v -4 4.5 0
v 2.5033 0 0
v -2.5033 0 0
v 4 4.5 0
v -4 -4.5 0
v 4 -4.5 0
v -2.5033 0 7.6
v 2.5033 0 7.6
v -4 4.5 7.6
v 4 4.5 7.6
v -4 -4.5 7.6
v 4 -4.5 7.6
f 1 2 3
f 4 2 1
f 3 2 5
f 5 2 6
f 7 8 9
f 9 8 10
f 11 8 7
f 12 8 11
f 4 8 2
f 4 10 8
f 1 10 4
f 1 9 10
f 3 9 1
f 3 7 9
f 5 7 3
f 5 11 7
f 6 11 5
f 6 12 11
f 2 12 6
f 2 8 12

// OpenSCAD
// file: ../lib/profile.scad
// Shared geometry: the foot and socket shapes every part is built from.
include <constants.scad>

// 2D rectangle of the given outer size with rounded corners, centred on the origin.
module rounded_rect(size, r) {
    offset(r = r) square([size.x - 2 * r, size.y - 2 * r], center = true);
}

// Solid whose outline shrinks with height according to `profile`,
// a bottom-to-top list of [z, inset from `size`]. Corner radius follows the inset.
module stepped_solid(size, r, profile) {
    for (i = [0 : len(profile) - 2]) {
        a = profile[i];
        b = profile[i + 1];
        hull() {
            translate([0, 0, a[0]])
                linear_extrude(EPS) rounded_rect(size - 2 * [a[1], a[1]], r - a[1]);
            translate([0, 0, b[0] - EPS])
                linear_extrude(EPS) rounded_rect(size - 2 * [b[1], b[1]], r - b[1]);
        }
    }
}

// One bin foot, sitting on z = 0, centred on its cell.
module foot() {
    stepped_solid([GRID - CLEARANCE, GRID - CLEARANCE], BIN_R, FOOT_PROFILE);
}

// Negative volume a foot drops into. `size` is the full grid area it spans.
// With through = true it is extended above and below so it cuts clean through a plate.
module socket(size = [GRID, GRID], through = false) {
    lo = SOCKET_PROFILE[0];
    hi = SOCKET_PROFILE[len(SOCKET_PROFILE) - 1];
    profile = through
        ? concat([[lo[0] - 1, lo[1]]], SOCKET_PROFILE, [[hi[0] + 1, hi[1]]])
        : SOCKET_PROFILE;
    stepped_solid(size, SOCKET_R, profile);
}

// Repeat children once per cell of an nx-by-ny grid centred on the origin.
module grid_copies(nx, ny) {
    for (i = [0 : nx - 1], j = [0 : ny - 1])
        translate([(i - (nx - 1) / 2) * GRID, (j - (ny - 1) / 2) * GRID, 0])
            children();
}
// file: ../lib/printer.scad
// Printer limits and the logic for splitting large parts to fit the bed.
// Values are for a Bambu Lab P2S; change them here if the printer changes.
include <constants.scad>

BED        = [256, 256, 256];   // build volume, mm
BED_MARGIN = 5;                 // space kept free at each bed edge (5 -> 5x5 cells max, 2 -> 6x6)

// Largest number of whole grid cells that fit along one bed axis (0 = X, 1 = Y).
function max_cells(axis) = floor((BED[axis] - 2 * BED_MARGIN) / GRID);

// True when a part of the given [x, y, z] size fits the bed.
function fits_bed(size) =
    size.x <= BED.x - 2 * BED_MARGIN &&
    size.y <= BED.y - 2 * BED_MARGIN &&
    (len(size) < 3 || size.z <= BED.z);

// Split n cells into the fewest runs of at most `limit` cells, as evenly as possible.
// split_cells(13, 5) -> [5, 4, 4]
function split_cells(n, limit) =
    let (count = ceil(n / limit), base = floor(n / count), extra = n - base * count)
    [for (i = [0 : count - 1]) base + (i < extra ? 1 : 0)];

// Sum of the first `count` entries of a list.
function sum_first(v, count) = count <= 0 ? 0 : v[count - 1] + sum_first(v, count - 1);
// file: ../lib/constants.scad
// Gridfinity standard dimensions (mm). Single source of truth:
// every other file includes this one and never hardcodes these numbers.

GRID      = 42;     // X/Y pitch of one cell
UNIT_Z    = 7;      // height of one "u"
CLEARANCE = 0.5;    // total X/Y gap between a bin and its grid space (0.25 per side)

// Bin foot: stepped chamfer, listed bottom to top as [z, inset from the foot's top outline].
FOOT_PROFILE = [[0, 2.95], [0.8, 2.15], [2.6, 2.15], [4.75, 0]];
FOOT_H       = 4.75;
BIN_R        = 3.75;   // outer corner radius of a bin

// Socket (baseplate cell and stacking lip): [z, inset from the 42 mm grid outline].
SOCKET_PROFILE = [[0, 2.85], [0.7, 2.15], [2.5, 2.15], [4.65, 0]];
SOCKET_H       = 4.65;
SOCKET_R       = 4;    // corner radius at the top of a socket

// Bin body
WALL      = 0.95;   // wall thickness
FLOOR_Z   = 7;      // top of the bin floor, measured from the bottom of the foot
LIP_H     = 4.4;    // nominal stacking-lip height above the bin body
LIP_TRIM  = 0.4;    // shave the knife edge off the lip tip so it prints cleanly
LIP_INSET = SOCKET_PROFILE[0][1] - CLEARANCE / 2;   // lip overhang from the outer wall (2.6)

// Magnets (optional)
MAGNET_D      = 6.5;
MAGNET_H      = 2.4;
MAGNET_OFFSET = 13;   // hole centre distance from the cell centre, in X and Y

EPS = 0.01;   // overlap used to avoid coincident faces in boolean cuts
$fn = 48;
// main file
// Bow-tie key that locks two smart tiles together. Press one into each pair of facing
// pockets from the underside. Print flat, as modelled.
include <../lib/constants.scad>
include <../lib/smart.scad>
use <smart_base.scad>

tile_key();

module tile_key() {
    linear_extrude(KEY_H - 0.4) {
        key_half();
        mirror([0, 1, 0]) key_half();
    }
}
